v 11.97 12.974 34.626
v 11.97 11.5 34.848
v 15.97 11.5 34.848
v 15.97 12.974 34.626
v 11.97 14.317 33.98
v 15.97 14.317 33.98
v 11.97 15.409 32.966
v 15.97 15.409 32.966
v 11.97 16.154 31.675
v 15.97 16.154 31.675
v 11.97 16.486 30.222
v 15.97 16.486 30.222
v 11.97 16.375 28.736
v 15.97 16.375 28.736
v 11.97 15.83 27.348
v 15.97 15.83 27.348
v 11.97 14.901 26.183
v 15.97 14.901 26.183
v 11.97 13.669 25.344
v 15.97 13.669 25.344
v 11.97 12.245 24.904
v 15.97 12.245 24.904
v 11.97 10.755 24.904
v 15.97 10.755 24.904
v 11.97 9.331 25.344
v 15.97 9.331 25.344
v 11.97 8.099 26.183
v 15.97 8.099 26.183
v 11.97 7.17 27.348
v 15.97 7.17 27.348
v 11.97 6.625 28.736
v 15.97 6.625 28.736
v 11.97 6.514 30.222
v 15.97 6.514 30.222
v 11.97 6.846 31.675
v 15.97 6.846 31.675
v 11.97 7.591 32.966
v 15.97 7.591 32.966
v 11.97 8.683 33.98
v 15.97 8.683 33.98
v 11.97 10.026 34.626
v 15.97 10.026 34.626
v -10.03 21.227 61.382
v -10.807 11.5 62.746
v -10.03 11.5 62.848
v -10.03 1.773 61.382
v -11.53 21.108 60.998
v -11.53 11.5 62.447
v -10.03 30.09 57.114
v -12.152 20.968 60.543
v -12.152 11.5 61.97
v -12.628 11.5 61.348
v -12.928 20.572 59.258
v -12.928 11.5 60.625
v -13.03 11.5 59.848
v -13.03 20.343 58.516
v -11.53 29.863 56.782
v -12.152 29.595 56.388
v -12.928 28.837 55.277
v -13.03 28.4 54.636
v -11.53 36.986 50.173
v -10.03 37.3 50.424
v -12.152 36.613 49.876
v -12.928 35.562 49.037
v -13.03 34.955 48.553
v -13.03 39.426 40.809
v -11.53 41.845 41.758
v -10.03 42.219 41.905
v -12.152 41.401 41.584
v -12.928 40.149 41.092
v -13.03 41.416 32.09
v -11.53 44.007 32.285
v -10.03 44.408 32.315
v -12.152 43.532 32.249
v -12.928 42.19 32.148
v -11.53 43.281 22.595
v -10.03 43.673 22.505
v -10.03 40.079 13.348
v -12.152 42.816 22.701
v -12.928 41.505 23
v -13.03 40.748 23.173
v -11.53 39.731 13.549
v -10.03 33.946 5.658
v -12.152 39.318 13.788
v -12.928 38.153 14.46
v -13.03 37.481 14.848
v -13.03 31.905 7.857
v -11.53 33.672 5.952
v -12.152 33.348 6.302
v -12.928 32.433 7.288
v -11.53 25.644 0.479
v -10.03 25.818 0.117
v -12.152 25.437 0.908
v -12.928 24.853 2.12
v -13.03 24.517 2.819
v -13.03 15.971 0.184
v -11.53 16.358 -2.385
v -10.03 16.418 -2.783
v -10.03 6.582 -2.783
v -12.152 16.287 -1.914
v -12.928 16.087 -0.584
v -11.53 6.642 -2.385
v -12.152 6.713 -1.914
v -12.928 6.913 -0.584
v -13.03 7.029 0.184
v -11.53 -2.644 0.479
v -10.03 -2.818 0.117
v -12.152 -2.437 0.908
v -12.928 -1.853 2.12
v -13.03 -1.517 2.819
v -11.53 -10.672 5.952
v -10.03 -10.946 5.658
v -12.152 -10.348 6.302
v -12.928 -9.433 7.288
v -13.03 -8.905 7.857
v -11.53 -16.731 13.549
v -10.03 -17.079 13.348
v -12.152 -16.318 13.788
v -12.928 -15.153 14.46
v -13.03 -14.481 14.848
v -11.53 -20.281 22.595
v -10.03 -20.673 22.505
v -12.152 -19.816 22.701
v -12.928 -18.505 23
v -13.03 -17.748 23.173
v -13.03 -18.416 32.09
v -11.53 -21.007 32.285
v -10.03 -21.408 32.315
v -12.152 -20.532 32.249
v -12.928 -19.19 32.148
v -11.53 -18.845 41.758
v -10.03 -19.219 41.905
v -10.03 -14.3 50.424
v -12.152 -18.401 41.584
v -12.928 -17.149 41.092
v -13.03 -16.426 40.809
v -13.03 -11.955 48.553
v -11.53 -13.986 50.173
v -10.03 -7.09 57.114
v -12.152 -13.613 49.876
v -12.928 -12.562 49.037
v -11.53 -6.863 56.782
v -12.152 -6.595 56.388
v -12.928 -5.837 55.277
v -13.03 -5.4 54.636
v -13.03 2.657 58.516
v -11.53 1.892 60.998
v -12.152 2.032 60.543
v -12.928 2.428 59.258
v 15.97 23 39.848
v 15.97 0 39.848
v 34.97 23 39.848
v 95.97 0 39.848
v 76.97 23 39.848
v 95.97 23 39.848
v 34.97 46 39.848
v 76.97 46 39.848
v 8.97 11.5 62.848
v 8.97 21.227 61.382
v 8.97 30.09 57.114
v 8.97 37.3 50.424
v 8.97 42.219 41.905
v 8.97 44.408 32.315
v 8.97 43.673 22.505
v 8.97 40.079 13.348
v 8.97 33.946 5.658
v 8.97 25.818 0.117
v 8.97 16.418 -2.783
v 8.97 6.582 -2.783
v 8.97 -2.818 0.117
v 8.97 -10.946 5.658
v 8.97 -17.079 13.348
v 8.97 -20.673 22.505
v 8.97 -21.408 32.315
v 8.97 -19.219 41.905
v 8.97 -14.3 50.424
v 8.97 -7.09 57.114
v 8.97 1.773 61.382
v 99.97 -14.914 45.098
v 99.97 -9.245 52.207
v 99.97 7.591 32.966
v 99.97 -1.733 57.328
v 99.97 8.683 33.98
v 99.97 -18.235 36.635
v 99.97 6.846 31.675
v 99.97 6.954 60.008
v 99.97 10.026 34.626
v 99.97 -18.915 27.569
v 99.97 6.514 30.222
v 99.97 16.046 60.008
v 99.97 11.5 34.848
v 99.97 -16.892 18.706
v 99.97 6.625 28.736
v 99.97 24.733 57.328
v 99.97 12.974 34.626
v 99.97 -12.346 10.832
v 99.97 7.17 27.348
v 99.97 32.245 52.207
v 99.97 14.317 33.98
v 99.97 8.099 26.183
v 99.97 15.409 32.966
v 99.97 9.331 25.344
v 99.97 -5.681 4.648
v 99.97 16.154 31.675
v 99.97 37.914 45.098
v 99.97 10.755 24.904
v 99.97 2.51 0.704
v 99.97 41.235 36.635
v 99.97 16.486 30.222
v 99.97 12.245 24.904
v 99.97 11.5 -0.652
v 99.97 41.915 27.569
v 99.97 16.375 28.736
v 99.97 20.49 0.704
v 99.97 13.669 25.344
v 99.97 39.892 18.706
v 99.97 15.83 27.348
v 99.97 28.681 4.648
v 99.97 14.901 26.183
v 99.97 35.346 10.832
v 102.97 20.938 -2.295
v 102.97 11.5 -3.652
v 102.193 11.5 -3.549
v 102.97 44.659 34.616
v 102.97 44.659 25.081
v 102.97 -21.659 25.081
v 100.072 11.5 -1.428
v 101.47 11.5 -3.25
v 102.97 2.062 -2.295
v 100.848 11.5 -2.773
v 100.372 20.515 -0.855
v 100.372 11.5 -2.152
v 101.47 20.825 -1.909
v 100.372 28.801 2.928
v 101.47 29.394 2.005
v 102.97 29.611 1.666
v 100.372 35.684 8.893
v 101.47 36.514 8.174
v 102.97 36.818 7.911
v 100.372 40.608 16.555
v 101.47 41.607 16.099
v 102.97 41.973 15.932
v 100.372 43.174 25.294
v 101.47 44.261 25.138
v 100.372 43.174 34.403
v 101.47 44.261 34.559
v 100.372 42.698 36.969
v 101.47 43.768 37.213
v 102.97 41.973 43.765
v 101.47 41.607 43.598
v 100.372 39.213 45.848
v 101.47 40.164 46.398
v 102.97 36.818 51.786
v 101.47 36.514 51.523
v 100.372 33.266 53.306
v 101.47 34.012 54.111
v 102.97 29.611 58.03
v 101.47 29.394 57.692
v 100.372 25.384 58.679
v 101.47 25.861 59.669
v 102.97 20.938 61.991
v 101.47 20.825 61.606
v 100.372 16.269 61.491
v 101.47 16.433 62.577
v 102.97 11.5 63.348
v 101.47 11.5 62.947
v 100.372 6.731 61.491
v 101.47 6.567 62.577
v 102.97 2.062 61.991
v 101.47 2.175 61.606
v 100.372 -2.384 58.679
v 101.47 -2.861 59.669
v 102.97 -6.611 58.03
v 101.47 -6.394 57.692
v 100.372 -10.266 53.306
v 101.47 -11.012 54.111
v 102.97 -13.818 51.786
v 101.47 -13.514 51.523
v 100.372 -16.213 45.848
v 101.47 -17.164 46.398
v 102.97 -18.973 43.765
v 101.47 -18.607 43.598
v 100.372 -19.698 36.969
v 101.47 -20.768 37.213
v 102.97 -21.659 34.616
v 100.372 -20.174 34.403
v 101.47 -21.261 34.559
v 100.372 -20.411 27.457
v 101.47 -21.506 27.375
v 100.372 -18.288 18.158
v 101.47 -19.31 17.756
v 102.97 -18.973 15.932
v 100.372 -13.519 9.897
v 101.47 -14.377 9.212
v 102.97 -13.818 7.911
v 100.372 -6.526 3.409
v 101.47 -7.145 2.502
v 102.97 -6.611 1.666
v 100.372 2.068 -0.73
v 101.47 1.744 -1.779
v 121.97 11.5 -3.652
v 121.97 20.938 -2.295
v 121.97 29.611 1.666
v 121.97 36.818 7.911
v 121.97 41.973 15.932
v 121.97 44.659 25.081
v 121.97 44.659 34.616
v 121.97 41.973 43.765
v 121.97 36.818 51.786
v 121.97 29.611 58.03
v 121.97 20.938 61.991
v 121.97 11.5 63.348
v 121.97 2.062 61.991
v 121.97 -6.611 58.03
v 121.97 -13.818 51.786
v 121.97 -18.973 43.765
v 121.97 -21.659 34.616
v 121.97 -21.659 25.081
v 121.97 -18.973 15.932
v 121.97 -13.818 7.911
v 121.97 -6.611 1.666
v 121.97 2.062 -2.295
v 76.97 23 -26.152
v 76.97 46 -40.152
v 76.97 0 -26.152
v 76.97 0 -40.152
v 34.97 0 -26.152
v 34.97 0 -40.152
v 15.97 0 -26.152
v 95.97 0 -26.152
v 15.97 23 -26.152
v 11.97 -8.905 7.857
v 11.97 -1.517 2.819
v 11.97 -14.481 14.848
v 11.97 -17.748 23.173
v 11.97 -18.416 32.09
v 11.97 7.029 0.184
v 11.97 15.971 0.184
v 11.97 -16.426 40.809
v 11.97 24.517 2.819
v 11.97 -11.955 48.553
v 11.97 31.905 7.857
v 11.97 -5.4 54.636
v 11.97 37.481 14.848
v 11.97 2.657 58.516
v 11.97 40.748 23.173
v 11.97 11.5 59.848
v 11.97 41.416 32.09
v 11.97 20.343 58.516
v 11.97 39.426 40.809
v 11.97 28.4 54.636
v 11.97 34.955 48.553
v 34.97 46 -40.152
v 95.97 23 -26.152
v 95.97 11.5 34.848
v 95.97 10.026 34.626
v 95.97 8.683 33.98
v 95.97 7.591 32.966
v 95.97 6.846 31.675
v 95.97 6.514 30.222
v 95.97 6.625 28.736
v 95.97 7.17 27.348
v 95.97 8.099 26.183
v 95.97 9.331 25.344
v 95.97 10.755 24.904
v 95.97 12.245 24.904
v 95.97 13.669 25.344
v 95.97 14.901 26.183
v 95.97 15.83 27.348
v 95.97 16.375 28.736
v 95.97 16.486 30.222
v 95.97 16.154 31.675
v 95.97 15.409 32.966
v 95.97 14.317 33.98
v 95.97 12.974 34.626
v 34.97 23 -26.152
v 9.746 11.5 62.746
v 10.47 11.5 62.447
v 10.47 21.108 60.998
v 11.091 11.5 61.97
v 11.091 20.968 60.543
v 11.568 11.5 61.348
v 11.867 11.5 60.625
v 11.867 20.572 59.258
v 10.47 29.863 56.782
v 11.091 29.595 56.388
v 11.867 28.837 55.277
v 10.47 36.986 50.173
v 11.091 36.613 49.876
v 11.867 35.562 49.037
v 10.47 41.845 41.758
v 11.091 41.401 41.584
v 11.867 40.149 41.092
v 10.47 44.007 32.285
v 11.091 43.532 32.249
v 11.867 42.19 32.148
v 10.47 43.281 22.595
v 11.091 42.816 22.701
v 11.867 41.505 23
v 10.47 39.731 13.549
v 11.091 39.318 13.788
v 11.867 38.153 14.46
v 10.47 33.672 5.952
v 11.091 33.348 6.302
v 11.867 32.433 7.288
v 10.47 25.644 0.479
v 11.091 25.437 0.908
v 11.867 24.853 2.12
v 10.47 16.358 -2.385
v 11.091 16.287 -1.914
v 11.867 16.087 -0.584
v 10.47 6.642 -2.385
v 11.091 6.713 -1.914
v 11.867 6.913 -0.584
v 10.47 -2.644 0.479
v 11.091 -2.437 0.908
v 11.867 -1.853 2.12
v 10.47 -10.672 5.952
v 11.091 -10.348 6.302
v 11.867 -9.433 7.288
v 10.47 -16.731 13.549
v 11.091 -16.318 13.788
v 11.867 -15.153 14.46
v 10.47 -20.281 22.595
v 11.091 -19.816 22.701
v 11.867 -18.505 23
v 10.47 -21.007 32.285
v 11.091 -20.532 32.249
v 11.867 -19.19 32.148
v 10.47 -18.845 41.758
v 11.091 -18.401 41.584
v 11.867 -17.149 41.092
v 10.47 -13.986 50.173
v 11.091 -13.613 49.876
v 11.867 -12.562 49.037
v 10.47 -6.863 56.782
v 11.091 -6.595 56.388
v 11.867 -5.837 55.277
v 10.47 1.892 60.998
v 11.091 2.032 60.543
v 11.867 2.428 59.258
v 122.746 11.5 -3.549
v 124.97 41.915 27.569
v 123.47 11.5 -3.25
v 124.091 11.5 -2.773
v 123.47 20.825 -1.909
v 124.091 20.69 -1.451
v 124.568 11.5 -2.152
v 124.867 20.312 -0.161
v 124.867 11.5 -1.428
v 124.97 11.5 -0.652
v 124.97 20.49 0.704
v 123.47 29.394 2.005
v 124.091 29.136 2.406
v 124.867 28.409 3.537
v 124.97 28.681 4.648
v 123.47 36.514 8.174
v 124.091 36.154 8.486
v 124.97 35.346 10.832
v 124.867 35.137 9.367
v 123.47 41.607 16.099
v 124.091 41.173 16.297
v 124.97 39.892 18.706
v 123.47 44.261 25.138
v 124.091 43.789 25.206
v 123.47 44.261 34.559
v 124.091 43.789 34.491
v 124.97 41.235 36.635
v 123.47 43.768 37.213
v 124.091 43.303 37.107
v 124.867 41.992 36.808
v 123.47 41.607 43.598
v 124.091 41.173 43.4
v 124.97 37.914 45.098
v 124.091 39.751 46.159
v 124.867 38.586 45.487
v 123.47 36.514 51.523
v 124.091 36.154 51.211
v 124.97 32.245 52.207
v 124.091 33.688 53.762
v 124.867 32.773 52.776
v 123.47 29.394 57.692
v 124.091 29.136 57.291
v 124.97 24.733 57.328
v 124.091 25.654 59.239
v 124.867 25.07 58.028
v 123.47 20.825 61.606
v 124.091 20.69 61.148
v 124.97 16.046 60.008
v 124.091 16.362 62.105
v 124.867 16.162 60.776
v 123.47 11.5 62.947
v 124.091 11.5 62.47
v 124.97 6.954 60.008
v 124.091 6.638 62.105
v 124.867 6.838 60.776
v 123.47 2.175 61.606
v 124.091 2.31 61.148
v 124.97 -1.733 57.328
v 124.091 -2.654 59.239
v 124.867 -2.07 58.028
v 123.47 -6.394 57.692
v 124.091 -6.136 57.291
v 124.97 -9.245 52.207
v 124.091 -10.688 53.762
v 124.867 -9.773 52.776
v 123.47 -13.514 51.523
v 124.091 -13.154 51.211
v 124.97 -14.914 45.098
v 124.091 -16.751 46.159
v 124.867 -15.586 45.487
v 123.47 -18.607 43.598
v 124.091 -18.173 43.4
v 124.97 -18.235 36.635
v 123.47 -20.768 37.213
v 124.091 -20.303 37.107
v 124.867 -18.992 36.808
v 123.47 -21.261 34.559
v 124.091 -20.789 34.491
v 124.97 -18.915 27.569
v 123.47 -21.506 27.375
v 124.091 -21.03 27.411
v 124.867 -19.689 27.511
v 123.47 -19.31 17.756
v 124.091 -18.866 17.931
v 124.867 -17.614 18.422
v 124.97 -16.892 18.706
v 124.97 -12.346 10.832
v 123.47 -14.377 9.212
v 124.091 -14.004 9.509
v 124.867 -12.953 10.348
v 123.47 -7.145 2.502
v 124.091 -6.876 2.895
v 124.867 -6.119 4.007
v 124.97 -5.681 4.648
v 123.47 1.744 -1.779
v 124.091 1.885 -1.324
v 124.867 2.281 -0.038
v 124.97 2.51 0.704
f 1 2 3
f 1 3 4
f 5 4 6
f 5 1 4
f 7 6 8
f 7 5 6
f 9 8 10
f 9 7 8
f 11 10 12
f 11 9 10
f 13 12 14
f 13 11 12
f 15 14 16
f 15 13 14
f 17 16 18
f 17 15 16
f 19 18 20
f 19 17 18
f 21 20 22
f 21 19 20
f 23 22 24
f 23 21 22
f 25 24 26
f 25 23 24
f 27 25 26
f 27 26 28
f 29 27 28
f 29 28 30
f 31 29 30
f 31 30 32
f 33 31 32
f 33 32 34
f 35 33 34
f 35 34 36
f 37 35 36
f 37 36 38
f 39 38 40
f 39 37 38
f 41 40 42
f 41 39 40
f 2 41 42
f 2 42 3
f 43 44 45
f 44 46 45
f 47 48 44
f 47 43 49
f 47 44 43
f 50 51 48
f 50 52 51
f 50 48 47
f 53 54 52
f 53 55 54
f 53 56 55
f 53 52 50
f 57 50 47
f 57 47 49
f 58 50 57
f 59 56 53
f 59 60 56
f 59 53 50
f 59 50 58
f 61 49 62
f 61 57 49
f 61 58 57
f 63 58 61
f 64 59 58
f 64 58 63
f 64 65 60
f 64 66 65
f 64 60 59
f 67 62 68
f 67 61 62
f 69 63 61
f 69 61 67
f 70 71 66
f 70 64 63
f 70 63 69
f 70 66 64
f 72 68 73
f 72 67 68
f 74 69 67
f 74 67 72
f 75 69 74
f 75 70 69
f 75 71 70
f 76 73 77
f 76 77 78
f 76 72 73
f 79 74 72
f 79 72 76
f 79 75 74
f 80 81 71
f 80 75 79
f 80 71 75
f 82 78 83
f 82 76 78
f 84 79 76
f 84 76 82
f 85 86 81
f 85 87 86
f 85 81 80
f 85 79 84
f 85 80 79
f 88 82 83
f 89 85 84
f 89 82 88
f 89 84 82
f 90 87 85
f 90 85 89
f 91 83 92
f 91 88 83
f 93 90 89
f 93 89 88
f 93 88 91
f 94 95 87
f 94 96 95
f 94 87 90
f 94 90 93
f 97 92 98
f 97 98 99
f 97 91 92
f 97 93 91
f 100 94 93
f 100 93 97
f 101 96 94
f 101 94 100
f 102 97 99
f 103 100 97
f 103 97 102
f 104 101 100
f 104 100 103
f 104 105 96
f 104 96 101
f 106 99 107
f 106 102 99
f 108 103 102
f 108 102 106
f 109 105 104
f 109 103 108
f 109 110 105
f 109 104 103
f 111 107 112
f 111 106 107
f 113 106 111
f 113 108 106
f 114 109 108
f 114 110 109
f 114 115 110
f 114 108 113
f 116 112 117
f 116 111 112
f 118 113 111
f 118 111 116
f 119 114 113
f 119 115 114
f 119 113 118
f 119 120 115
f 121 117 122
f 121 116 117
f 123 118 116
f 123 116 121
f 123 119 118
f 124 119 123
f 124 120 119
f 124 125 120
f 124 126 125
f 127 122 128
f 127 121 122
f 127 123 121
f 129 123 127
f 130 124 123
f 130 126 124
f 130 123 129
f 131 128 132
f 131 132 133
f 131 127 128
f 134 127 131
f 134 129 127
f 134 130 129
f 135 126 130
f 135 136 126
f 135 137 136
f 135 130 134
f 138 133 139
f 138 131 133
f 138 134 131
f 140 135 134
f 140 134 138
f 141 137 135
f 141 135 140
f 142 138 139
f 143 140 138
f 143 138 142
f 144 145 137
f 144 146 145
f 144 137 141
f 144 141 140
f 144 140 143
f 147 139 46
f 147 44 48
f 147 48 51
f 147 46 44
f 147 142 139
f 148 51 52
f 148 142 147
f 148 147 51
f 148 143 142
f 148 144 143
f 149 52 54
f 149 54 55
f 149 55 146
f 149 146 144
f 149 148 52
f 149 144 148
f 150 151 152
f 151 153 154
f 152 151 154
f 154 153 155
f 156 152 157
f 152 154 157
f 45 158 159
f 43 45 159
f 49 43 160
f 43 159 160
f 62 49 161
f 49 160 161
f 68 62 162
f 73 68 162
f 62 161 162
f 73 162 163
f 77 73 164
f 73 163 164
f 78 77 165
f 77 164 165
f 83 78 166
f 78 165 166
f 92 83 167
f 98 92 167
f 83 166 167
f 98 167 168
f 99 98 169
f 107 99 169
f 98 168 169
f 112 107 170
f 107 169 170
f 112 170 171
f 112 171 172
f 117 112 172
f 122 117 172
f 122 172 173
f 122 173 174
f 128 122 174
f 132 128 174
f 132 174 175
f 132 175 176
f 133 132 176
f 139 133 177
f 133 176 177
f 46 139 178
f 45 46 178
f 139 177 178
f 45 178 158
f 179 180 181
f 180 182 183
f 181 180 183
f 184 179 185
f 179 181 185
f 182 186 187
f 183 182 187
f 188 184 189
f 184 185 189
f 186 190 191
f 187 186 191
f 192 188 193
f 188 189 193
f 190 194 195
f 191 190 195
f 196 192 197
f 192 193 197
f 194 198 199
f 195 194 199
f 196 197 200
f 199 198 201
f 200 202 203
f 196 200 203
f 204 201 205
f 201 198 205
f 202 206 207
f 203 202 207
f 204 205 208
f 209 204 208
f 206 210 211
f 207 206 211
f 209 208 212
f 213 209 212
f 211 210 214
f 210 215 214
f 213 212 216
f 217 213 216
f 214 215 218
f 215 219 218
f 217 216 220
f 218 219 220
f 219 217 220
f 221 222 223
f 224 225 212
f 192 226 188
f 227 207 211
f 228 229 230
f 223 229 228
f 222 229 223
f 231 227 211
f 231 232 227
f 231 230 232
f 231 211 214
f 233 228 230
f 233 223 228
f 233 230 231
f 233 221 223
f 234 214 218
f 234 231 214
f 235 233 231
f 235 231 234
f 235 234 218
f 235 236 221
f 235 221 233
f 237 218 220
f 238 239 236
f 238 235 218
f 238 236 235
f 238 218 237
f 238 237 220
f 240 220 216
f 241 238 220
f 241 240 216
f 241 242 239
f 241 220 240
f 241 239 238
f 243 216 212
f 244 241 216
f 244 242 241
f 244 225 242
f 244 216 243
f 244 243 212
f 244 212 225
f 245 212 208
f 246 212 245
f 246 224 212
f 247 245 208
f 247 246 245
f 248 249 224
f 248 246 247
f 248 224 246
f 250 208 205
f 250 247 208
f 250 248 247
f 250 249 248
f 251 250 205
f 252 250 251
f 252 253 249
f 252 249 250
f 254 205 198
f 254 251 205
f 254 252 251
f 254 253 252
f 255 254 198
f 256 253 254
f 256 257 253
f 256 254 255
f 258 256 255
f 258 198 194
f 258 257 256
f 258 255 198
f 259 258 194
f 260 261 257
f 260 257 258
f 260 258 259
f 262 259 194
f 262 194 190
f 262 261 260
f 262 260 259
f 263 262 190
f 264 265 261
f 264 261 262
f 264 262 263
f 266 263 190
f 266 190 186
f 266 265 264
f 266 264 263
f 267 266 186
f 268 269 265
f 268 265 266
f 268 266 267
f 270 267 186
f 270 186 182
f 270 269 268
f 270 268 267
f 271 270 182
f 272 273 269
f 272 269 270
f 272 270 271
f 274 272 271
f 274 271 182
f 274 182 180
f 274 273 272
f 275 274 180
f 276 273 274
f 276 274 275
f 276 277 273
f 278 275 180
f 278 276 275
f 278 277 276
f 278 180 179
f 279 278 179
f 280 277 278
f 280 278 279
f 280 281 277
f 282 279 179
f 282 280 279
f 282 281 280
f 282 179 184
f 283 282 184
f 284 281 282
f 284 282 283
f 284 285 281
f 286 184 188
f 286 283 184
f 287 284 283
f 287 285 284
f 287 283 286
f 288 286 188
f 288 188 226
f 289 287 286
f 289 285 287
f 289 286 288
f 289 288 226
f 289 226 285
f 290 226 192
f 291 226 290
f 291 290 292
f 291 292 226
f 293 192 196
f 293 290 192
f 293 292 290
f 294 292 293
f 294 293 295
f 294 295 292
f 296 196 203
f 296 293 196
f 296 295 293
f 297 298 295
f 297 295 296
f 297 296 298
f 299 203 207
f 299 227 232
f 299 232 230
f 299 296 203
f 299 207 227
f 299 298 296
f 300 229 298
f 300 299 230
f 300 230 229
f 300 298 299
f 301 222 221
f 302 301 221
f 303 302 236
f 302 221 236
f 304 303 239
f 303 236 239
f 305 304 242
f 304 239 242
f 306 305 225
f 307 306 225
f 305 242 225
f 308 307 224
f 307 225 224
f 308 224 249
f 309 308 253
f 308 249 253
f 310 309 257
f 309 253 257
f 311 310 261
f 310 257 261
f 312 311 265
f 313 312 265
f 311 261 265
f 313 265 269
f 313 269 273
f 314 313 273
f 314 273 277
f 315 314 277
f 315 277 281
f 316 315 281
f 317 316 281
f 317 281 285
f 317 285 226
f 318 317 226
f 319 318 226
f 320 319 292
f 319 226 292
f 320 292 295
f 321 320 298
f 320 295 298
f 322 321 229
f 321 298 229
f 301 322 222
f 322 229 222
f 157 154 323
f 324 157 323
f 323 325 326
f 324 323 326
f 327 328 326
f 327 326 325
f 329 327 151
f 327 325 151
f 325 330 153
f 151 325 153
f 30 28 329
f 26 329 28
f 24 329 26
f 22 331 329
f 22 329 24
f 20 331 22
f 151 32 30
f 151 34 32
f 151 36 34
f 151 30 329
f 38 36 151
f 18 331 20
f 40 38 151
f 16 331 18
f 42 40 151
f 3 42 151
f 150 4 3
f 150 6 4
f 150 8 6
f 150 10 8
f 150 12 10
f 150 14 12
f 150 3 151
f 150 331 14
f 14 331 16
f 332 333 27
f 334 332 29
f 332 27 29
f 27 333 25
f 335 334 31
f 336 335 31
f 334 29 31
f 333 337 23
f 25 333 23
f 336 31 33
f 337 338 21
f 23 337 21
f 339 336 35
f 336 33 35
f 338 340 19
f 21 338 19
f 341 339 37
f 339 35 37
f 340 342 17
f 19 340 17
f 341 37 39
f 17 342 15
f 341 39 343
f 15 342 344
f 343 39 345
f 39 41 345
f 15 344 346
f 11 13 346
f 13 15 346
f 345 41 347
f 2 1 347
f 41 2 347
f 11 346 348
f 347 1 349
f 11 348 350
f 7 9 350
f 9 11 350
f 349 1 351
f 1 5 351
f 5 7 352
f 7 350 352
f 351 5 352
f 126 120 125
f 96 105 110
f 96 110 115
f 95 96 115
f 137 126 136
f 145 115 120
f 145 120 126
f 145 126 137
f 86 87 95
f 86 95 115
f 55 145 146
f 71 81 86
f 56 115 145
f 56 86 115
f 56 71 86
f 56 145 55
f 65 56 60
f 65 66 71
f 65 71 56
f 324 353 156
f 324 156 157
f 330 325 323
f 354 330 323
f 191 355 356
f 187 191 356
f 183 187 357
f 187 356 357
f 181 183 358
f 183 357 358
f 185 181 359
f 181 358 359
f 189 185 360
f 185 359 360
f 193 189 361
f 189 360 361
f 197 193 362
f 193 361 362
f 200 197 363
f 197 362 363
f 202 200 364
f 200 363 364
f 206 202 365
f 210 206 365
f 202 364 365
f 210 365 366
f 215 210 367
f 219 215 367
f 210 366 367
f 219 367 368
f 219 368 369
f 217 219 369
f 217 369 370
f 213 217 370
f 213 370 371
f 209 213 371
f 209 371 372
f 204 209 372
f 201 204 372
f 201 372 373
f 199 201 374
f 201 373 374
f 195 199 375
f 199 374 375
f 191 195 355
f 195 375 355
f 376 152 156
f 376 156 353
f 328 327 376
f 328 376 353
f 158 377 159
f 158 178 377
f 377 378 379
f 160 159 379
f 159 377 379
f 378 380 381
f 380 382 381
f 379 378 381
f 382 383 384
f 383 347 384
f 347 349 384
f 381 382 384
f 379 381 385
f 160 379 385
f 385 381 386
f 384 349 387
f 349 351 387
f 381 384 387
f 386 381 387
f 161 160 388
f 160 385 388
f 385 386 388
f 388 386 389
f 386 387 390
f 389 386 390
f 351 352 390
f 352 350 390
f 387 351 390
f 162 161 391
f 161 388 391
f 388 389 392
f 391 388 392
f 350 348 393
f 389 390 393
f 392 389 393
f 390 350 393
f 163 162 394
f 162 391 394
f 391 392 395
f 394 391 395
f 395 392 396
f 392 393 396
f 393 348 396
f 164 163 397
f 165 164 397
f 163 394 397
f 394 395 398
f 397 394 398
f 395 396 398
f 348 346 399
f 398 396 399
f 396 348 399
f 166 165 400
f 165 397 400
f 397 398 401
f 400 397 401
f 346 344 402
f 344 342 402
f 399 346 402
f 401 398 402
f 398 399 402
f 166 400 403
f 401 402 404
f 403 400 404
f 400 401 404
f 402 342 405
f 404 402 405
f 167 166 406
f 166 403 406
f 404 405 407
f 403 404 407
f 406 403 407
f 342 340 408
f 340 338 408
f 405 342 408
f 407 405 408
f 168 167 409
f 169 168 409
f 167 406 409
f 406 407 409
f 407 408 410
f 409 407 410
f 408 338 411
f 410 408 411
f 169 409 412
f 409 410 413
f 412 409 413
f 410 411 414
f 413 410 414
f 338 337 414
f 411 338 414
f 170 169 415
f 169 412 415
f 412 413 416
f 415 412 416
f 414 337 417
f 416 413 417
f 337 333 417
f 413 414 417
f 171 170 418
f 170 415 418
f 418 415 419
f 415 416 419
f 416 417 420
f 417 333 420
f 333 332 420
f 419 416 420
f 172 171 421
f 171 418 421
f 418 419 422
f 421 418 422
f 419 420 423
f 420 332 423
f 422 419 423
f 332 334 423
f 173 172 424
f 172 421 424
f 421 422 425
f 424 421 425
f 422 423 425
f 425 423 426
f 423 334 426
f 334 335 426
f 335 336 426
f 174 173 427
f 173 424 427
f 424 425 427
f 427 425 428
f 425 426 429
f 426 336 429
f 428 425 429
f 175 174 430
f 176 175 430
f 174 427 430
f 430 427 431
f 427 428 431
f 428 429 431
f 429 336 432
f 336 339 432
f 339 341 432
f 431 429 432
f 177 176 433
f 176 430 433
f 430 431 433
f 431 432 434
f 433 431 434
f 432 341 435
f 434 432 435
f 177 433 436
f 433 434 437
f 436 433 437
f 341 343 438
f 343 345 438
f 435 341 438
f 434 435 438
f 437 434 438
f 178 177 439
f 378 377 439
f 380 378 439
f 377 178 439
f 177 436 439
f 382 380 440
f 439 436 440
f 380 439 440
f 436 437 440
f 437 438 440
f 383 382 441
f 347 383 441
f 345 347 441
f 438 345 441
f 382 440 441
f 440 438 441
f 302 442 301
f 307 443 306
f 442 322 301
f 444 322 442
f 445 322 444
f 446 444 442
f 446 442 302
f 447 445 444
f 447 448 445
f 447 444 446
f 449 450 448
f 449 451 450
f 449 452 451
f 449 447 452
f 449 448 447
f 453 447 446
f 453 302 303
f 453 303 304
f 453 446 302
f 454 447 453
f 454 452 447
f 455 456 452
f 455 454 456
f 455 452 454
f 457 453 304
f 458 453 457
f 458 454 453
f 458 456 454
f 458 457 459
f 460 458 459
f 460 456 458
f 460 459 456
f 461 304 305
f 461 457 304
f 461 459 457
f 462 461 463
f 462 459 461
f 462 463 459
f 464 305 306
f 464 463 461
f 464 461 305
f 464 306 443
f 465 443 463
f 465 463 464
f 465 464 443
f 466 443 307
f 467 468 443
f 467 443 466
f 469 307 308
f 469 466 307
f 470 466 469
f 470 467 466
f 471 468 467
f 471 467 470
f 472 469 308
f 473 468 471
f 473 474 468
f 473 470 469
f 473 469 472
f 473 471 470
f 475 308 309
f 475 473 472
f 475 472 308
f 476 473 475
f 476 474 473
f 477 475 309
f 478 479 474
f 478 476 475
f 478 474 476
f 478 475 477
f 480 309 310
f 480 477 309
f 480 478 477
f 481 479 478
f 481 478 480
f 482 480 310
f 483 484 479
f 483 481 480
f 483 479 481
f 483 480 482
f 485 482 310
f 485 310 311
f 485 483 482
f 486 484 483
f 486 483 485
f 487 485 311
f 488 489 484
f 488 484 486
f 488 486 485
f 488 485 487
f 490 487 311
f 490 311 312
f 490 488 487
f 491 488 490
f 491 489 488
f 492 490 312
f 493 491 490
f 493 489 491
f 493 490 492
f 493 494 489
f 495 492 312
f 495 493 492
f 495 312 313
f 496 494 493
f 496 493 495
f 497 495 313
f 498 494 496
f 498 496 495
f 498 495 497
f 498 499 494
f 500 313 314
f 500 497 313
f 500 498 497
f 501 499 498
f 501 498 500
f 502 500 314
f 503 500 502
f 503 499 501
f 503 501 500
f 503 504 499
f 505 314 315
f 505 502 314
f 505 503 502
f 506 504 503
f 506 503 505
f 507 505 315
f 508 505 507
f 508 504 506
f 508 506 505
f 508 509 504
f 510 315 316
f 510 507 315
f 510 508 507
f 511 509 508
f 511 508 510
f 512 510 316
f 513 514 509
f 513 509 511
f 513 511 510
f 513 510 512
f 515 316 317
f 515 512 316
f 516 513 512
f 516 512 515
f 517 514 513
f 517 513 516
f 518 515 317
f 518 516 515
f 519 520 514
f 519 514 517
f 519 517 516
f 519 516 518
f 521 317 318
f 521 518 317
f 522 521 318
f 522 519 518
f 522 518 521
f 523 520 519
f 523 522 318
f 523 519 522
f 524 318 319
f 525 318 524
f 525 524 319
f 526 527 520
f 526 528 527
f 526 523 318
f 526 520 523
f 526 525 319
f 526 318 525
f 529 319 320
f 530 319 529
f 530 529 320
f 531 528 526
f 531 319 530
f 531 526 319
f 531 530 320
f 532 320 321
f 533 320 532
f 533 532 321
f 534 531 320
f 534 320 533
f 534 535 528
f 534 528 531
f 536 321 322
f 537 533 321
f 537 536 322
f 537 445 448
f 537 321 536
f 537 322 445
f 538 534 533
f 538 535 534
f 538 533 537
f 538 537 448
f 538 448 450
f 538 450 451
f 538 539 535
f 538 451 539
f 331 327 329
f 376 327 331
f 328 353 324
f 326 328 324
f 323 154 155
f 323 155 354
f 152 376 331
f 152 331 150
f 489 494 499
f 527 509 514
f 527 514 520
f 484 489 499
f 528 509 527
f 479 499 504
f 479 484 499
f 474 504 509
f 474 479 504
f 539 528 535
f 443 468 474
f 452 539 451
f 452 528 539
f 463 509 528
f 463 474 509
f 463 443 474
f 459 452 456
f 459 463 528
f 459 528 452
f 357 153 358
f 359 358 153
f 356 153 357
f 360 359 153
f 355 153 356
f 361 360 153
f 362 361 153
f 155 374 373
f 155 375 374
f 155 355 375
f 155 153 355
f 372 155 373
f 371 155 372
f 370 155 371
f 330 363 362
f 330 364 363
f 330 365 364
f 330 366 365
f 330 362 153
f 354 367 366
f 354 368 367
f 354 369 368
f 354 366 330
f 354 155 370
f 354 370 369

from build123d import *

# Parameters (mm, degrees)
SKETCH2_W           = 42
SKETCH2_H           = 80
BOSS_EXTRUDE1_DEPTH = 46
SKETCH3_W           = 66
SKETCH3_H           = 23
BOSS_EXTRUDE2_DEPTH = 19
SKETCH4_R           = 5
BOSS_EXTRUDE3_DEPTH = 4
SKETCH5_R           = 33.5
BOSS_EXTRUDE4_DEPTH = 25
SKETCH6_W           = 66
SKETCH6_H           = 23
BOSS_EXTRUDE5_DEPTH = 19
BOSS_EXTRUDE6_START = 4
SKETCH8_R           = 5
BOSS_EXTRUDE6_DEPTH = 4
SKETCH10_R          = 33
BOSS_EXTRUDE7_DEPTH = 25
FILLET2_R           = 3


with BuildPart() as part:
    # Sketch2 → Boss-Extrude1 (new body)
    with BuildSketch(Plane(origin=(0, 0, 0), x_dir=(1, 0, 0), z_dir=(0, 1, 0))):
        with Locations((55.96969697, 0.151515152)):
            Rectangle(SKETCH2_W, SKETCH2_H)
    extrude(amount=BOSS_EXTRUDE1_DEPTH)

    # Sketch3 → Boss-Extrude2 (add)
    with BuildSketch(Plane(origin=(76.96969697, 0, 0), x_dir=(0, 0, -1), z_dir=(1, 0, 0))):
        with Locations((-6.848484848, 11.5)):
            Rectangle(SKETCH3_W, SKETCH3_H)
    extrude(amount=BOSS_EXTRUDE2_DEPTH)

    # Sketch4 → Boss-Extrude3 (add)
    with BuildSketch(Plane(origin=(95.96969697, 0, 0), x_dir=(0, 0, -1), z_dir=(1, 0, 0))):
        with Locations(Location((-29.848484848, 11.5, 0), (0, 0, 180))):
            Circle(SKETCH4_R)
    extrude(amount=BOSS_EXTRUDE3_DEPTH)

    # Sketch5 → Boss-Extrude4 (add)
    with BuildSketch(Plane(origin=(99.96969697, 0, 0), x_dir=(0, 0, -1), z_dir=(1, 0, 0))):
        with Locations((-29.848484848, 11.5)):
            Circle(SKETCH5_R)
    extrude(amount=BOSS_EXTRUDE4_DEPTH)

    # Sketch6 → Boss-Extrude5 (add)
    with BuildSketch(Plane.ZY.offset(-34.96969697)):
        with Locations((6.848484848, 11.5)):
            Rectangle(SKETCH6_W, SKETCH6_H)
    extrude(amount=BOSS_EXTRUDE5_DEPTH)

    # Sketch8 → Boss-Extrude6 (add)
    with BuildSketch(Plane.ZY.offset(-15.96969697).offset(BOSS_EXTRUDE6_START)):
        with Locations((29.848484848, 11.5)):
            Circle(SKETCH8_R)
    extrude(amount=-BOSS_EXTRUDE6_DEPTH)

    # Sketch10 → Boss-Extrude7 (add)
    with BuildSketch(Plane.ZY.offset(-11.96969697)):
        with Locations((29.848484848, 11.5)):
            Circle(SKETCH10_R)
    extrude(amount=BOSS_EXTRUDE7_DEPTH)

    # Fillet2
    fillet2_edges = [part.edges().sort_by_distance(p)[0] for p in [
        (99.96969697, 11.5, 63.348484848),
        (124.96969697, 11.5, 63.348484848),
        (11.96969697, 11.5, -3.151515152),
        (-13.03030303, 11.5, -3.151515152),
    ]]
    fillet(fillet2_edges, radius=FILLET2_R)


solid = part.part
